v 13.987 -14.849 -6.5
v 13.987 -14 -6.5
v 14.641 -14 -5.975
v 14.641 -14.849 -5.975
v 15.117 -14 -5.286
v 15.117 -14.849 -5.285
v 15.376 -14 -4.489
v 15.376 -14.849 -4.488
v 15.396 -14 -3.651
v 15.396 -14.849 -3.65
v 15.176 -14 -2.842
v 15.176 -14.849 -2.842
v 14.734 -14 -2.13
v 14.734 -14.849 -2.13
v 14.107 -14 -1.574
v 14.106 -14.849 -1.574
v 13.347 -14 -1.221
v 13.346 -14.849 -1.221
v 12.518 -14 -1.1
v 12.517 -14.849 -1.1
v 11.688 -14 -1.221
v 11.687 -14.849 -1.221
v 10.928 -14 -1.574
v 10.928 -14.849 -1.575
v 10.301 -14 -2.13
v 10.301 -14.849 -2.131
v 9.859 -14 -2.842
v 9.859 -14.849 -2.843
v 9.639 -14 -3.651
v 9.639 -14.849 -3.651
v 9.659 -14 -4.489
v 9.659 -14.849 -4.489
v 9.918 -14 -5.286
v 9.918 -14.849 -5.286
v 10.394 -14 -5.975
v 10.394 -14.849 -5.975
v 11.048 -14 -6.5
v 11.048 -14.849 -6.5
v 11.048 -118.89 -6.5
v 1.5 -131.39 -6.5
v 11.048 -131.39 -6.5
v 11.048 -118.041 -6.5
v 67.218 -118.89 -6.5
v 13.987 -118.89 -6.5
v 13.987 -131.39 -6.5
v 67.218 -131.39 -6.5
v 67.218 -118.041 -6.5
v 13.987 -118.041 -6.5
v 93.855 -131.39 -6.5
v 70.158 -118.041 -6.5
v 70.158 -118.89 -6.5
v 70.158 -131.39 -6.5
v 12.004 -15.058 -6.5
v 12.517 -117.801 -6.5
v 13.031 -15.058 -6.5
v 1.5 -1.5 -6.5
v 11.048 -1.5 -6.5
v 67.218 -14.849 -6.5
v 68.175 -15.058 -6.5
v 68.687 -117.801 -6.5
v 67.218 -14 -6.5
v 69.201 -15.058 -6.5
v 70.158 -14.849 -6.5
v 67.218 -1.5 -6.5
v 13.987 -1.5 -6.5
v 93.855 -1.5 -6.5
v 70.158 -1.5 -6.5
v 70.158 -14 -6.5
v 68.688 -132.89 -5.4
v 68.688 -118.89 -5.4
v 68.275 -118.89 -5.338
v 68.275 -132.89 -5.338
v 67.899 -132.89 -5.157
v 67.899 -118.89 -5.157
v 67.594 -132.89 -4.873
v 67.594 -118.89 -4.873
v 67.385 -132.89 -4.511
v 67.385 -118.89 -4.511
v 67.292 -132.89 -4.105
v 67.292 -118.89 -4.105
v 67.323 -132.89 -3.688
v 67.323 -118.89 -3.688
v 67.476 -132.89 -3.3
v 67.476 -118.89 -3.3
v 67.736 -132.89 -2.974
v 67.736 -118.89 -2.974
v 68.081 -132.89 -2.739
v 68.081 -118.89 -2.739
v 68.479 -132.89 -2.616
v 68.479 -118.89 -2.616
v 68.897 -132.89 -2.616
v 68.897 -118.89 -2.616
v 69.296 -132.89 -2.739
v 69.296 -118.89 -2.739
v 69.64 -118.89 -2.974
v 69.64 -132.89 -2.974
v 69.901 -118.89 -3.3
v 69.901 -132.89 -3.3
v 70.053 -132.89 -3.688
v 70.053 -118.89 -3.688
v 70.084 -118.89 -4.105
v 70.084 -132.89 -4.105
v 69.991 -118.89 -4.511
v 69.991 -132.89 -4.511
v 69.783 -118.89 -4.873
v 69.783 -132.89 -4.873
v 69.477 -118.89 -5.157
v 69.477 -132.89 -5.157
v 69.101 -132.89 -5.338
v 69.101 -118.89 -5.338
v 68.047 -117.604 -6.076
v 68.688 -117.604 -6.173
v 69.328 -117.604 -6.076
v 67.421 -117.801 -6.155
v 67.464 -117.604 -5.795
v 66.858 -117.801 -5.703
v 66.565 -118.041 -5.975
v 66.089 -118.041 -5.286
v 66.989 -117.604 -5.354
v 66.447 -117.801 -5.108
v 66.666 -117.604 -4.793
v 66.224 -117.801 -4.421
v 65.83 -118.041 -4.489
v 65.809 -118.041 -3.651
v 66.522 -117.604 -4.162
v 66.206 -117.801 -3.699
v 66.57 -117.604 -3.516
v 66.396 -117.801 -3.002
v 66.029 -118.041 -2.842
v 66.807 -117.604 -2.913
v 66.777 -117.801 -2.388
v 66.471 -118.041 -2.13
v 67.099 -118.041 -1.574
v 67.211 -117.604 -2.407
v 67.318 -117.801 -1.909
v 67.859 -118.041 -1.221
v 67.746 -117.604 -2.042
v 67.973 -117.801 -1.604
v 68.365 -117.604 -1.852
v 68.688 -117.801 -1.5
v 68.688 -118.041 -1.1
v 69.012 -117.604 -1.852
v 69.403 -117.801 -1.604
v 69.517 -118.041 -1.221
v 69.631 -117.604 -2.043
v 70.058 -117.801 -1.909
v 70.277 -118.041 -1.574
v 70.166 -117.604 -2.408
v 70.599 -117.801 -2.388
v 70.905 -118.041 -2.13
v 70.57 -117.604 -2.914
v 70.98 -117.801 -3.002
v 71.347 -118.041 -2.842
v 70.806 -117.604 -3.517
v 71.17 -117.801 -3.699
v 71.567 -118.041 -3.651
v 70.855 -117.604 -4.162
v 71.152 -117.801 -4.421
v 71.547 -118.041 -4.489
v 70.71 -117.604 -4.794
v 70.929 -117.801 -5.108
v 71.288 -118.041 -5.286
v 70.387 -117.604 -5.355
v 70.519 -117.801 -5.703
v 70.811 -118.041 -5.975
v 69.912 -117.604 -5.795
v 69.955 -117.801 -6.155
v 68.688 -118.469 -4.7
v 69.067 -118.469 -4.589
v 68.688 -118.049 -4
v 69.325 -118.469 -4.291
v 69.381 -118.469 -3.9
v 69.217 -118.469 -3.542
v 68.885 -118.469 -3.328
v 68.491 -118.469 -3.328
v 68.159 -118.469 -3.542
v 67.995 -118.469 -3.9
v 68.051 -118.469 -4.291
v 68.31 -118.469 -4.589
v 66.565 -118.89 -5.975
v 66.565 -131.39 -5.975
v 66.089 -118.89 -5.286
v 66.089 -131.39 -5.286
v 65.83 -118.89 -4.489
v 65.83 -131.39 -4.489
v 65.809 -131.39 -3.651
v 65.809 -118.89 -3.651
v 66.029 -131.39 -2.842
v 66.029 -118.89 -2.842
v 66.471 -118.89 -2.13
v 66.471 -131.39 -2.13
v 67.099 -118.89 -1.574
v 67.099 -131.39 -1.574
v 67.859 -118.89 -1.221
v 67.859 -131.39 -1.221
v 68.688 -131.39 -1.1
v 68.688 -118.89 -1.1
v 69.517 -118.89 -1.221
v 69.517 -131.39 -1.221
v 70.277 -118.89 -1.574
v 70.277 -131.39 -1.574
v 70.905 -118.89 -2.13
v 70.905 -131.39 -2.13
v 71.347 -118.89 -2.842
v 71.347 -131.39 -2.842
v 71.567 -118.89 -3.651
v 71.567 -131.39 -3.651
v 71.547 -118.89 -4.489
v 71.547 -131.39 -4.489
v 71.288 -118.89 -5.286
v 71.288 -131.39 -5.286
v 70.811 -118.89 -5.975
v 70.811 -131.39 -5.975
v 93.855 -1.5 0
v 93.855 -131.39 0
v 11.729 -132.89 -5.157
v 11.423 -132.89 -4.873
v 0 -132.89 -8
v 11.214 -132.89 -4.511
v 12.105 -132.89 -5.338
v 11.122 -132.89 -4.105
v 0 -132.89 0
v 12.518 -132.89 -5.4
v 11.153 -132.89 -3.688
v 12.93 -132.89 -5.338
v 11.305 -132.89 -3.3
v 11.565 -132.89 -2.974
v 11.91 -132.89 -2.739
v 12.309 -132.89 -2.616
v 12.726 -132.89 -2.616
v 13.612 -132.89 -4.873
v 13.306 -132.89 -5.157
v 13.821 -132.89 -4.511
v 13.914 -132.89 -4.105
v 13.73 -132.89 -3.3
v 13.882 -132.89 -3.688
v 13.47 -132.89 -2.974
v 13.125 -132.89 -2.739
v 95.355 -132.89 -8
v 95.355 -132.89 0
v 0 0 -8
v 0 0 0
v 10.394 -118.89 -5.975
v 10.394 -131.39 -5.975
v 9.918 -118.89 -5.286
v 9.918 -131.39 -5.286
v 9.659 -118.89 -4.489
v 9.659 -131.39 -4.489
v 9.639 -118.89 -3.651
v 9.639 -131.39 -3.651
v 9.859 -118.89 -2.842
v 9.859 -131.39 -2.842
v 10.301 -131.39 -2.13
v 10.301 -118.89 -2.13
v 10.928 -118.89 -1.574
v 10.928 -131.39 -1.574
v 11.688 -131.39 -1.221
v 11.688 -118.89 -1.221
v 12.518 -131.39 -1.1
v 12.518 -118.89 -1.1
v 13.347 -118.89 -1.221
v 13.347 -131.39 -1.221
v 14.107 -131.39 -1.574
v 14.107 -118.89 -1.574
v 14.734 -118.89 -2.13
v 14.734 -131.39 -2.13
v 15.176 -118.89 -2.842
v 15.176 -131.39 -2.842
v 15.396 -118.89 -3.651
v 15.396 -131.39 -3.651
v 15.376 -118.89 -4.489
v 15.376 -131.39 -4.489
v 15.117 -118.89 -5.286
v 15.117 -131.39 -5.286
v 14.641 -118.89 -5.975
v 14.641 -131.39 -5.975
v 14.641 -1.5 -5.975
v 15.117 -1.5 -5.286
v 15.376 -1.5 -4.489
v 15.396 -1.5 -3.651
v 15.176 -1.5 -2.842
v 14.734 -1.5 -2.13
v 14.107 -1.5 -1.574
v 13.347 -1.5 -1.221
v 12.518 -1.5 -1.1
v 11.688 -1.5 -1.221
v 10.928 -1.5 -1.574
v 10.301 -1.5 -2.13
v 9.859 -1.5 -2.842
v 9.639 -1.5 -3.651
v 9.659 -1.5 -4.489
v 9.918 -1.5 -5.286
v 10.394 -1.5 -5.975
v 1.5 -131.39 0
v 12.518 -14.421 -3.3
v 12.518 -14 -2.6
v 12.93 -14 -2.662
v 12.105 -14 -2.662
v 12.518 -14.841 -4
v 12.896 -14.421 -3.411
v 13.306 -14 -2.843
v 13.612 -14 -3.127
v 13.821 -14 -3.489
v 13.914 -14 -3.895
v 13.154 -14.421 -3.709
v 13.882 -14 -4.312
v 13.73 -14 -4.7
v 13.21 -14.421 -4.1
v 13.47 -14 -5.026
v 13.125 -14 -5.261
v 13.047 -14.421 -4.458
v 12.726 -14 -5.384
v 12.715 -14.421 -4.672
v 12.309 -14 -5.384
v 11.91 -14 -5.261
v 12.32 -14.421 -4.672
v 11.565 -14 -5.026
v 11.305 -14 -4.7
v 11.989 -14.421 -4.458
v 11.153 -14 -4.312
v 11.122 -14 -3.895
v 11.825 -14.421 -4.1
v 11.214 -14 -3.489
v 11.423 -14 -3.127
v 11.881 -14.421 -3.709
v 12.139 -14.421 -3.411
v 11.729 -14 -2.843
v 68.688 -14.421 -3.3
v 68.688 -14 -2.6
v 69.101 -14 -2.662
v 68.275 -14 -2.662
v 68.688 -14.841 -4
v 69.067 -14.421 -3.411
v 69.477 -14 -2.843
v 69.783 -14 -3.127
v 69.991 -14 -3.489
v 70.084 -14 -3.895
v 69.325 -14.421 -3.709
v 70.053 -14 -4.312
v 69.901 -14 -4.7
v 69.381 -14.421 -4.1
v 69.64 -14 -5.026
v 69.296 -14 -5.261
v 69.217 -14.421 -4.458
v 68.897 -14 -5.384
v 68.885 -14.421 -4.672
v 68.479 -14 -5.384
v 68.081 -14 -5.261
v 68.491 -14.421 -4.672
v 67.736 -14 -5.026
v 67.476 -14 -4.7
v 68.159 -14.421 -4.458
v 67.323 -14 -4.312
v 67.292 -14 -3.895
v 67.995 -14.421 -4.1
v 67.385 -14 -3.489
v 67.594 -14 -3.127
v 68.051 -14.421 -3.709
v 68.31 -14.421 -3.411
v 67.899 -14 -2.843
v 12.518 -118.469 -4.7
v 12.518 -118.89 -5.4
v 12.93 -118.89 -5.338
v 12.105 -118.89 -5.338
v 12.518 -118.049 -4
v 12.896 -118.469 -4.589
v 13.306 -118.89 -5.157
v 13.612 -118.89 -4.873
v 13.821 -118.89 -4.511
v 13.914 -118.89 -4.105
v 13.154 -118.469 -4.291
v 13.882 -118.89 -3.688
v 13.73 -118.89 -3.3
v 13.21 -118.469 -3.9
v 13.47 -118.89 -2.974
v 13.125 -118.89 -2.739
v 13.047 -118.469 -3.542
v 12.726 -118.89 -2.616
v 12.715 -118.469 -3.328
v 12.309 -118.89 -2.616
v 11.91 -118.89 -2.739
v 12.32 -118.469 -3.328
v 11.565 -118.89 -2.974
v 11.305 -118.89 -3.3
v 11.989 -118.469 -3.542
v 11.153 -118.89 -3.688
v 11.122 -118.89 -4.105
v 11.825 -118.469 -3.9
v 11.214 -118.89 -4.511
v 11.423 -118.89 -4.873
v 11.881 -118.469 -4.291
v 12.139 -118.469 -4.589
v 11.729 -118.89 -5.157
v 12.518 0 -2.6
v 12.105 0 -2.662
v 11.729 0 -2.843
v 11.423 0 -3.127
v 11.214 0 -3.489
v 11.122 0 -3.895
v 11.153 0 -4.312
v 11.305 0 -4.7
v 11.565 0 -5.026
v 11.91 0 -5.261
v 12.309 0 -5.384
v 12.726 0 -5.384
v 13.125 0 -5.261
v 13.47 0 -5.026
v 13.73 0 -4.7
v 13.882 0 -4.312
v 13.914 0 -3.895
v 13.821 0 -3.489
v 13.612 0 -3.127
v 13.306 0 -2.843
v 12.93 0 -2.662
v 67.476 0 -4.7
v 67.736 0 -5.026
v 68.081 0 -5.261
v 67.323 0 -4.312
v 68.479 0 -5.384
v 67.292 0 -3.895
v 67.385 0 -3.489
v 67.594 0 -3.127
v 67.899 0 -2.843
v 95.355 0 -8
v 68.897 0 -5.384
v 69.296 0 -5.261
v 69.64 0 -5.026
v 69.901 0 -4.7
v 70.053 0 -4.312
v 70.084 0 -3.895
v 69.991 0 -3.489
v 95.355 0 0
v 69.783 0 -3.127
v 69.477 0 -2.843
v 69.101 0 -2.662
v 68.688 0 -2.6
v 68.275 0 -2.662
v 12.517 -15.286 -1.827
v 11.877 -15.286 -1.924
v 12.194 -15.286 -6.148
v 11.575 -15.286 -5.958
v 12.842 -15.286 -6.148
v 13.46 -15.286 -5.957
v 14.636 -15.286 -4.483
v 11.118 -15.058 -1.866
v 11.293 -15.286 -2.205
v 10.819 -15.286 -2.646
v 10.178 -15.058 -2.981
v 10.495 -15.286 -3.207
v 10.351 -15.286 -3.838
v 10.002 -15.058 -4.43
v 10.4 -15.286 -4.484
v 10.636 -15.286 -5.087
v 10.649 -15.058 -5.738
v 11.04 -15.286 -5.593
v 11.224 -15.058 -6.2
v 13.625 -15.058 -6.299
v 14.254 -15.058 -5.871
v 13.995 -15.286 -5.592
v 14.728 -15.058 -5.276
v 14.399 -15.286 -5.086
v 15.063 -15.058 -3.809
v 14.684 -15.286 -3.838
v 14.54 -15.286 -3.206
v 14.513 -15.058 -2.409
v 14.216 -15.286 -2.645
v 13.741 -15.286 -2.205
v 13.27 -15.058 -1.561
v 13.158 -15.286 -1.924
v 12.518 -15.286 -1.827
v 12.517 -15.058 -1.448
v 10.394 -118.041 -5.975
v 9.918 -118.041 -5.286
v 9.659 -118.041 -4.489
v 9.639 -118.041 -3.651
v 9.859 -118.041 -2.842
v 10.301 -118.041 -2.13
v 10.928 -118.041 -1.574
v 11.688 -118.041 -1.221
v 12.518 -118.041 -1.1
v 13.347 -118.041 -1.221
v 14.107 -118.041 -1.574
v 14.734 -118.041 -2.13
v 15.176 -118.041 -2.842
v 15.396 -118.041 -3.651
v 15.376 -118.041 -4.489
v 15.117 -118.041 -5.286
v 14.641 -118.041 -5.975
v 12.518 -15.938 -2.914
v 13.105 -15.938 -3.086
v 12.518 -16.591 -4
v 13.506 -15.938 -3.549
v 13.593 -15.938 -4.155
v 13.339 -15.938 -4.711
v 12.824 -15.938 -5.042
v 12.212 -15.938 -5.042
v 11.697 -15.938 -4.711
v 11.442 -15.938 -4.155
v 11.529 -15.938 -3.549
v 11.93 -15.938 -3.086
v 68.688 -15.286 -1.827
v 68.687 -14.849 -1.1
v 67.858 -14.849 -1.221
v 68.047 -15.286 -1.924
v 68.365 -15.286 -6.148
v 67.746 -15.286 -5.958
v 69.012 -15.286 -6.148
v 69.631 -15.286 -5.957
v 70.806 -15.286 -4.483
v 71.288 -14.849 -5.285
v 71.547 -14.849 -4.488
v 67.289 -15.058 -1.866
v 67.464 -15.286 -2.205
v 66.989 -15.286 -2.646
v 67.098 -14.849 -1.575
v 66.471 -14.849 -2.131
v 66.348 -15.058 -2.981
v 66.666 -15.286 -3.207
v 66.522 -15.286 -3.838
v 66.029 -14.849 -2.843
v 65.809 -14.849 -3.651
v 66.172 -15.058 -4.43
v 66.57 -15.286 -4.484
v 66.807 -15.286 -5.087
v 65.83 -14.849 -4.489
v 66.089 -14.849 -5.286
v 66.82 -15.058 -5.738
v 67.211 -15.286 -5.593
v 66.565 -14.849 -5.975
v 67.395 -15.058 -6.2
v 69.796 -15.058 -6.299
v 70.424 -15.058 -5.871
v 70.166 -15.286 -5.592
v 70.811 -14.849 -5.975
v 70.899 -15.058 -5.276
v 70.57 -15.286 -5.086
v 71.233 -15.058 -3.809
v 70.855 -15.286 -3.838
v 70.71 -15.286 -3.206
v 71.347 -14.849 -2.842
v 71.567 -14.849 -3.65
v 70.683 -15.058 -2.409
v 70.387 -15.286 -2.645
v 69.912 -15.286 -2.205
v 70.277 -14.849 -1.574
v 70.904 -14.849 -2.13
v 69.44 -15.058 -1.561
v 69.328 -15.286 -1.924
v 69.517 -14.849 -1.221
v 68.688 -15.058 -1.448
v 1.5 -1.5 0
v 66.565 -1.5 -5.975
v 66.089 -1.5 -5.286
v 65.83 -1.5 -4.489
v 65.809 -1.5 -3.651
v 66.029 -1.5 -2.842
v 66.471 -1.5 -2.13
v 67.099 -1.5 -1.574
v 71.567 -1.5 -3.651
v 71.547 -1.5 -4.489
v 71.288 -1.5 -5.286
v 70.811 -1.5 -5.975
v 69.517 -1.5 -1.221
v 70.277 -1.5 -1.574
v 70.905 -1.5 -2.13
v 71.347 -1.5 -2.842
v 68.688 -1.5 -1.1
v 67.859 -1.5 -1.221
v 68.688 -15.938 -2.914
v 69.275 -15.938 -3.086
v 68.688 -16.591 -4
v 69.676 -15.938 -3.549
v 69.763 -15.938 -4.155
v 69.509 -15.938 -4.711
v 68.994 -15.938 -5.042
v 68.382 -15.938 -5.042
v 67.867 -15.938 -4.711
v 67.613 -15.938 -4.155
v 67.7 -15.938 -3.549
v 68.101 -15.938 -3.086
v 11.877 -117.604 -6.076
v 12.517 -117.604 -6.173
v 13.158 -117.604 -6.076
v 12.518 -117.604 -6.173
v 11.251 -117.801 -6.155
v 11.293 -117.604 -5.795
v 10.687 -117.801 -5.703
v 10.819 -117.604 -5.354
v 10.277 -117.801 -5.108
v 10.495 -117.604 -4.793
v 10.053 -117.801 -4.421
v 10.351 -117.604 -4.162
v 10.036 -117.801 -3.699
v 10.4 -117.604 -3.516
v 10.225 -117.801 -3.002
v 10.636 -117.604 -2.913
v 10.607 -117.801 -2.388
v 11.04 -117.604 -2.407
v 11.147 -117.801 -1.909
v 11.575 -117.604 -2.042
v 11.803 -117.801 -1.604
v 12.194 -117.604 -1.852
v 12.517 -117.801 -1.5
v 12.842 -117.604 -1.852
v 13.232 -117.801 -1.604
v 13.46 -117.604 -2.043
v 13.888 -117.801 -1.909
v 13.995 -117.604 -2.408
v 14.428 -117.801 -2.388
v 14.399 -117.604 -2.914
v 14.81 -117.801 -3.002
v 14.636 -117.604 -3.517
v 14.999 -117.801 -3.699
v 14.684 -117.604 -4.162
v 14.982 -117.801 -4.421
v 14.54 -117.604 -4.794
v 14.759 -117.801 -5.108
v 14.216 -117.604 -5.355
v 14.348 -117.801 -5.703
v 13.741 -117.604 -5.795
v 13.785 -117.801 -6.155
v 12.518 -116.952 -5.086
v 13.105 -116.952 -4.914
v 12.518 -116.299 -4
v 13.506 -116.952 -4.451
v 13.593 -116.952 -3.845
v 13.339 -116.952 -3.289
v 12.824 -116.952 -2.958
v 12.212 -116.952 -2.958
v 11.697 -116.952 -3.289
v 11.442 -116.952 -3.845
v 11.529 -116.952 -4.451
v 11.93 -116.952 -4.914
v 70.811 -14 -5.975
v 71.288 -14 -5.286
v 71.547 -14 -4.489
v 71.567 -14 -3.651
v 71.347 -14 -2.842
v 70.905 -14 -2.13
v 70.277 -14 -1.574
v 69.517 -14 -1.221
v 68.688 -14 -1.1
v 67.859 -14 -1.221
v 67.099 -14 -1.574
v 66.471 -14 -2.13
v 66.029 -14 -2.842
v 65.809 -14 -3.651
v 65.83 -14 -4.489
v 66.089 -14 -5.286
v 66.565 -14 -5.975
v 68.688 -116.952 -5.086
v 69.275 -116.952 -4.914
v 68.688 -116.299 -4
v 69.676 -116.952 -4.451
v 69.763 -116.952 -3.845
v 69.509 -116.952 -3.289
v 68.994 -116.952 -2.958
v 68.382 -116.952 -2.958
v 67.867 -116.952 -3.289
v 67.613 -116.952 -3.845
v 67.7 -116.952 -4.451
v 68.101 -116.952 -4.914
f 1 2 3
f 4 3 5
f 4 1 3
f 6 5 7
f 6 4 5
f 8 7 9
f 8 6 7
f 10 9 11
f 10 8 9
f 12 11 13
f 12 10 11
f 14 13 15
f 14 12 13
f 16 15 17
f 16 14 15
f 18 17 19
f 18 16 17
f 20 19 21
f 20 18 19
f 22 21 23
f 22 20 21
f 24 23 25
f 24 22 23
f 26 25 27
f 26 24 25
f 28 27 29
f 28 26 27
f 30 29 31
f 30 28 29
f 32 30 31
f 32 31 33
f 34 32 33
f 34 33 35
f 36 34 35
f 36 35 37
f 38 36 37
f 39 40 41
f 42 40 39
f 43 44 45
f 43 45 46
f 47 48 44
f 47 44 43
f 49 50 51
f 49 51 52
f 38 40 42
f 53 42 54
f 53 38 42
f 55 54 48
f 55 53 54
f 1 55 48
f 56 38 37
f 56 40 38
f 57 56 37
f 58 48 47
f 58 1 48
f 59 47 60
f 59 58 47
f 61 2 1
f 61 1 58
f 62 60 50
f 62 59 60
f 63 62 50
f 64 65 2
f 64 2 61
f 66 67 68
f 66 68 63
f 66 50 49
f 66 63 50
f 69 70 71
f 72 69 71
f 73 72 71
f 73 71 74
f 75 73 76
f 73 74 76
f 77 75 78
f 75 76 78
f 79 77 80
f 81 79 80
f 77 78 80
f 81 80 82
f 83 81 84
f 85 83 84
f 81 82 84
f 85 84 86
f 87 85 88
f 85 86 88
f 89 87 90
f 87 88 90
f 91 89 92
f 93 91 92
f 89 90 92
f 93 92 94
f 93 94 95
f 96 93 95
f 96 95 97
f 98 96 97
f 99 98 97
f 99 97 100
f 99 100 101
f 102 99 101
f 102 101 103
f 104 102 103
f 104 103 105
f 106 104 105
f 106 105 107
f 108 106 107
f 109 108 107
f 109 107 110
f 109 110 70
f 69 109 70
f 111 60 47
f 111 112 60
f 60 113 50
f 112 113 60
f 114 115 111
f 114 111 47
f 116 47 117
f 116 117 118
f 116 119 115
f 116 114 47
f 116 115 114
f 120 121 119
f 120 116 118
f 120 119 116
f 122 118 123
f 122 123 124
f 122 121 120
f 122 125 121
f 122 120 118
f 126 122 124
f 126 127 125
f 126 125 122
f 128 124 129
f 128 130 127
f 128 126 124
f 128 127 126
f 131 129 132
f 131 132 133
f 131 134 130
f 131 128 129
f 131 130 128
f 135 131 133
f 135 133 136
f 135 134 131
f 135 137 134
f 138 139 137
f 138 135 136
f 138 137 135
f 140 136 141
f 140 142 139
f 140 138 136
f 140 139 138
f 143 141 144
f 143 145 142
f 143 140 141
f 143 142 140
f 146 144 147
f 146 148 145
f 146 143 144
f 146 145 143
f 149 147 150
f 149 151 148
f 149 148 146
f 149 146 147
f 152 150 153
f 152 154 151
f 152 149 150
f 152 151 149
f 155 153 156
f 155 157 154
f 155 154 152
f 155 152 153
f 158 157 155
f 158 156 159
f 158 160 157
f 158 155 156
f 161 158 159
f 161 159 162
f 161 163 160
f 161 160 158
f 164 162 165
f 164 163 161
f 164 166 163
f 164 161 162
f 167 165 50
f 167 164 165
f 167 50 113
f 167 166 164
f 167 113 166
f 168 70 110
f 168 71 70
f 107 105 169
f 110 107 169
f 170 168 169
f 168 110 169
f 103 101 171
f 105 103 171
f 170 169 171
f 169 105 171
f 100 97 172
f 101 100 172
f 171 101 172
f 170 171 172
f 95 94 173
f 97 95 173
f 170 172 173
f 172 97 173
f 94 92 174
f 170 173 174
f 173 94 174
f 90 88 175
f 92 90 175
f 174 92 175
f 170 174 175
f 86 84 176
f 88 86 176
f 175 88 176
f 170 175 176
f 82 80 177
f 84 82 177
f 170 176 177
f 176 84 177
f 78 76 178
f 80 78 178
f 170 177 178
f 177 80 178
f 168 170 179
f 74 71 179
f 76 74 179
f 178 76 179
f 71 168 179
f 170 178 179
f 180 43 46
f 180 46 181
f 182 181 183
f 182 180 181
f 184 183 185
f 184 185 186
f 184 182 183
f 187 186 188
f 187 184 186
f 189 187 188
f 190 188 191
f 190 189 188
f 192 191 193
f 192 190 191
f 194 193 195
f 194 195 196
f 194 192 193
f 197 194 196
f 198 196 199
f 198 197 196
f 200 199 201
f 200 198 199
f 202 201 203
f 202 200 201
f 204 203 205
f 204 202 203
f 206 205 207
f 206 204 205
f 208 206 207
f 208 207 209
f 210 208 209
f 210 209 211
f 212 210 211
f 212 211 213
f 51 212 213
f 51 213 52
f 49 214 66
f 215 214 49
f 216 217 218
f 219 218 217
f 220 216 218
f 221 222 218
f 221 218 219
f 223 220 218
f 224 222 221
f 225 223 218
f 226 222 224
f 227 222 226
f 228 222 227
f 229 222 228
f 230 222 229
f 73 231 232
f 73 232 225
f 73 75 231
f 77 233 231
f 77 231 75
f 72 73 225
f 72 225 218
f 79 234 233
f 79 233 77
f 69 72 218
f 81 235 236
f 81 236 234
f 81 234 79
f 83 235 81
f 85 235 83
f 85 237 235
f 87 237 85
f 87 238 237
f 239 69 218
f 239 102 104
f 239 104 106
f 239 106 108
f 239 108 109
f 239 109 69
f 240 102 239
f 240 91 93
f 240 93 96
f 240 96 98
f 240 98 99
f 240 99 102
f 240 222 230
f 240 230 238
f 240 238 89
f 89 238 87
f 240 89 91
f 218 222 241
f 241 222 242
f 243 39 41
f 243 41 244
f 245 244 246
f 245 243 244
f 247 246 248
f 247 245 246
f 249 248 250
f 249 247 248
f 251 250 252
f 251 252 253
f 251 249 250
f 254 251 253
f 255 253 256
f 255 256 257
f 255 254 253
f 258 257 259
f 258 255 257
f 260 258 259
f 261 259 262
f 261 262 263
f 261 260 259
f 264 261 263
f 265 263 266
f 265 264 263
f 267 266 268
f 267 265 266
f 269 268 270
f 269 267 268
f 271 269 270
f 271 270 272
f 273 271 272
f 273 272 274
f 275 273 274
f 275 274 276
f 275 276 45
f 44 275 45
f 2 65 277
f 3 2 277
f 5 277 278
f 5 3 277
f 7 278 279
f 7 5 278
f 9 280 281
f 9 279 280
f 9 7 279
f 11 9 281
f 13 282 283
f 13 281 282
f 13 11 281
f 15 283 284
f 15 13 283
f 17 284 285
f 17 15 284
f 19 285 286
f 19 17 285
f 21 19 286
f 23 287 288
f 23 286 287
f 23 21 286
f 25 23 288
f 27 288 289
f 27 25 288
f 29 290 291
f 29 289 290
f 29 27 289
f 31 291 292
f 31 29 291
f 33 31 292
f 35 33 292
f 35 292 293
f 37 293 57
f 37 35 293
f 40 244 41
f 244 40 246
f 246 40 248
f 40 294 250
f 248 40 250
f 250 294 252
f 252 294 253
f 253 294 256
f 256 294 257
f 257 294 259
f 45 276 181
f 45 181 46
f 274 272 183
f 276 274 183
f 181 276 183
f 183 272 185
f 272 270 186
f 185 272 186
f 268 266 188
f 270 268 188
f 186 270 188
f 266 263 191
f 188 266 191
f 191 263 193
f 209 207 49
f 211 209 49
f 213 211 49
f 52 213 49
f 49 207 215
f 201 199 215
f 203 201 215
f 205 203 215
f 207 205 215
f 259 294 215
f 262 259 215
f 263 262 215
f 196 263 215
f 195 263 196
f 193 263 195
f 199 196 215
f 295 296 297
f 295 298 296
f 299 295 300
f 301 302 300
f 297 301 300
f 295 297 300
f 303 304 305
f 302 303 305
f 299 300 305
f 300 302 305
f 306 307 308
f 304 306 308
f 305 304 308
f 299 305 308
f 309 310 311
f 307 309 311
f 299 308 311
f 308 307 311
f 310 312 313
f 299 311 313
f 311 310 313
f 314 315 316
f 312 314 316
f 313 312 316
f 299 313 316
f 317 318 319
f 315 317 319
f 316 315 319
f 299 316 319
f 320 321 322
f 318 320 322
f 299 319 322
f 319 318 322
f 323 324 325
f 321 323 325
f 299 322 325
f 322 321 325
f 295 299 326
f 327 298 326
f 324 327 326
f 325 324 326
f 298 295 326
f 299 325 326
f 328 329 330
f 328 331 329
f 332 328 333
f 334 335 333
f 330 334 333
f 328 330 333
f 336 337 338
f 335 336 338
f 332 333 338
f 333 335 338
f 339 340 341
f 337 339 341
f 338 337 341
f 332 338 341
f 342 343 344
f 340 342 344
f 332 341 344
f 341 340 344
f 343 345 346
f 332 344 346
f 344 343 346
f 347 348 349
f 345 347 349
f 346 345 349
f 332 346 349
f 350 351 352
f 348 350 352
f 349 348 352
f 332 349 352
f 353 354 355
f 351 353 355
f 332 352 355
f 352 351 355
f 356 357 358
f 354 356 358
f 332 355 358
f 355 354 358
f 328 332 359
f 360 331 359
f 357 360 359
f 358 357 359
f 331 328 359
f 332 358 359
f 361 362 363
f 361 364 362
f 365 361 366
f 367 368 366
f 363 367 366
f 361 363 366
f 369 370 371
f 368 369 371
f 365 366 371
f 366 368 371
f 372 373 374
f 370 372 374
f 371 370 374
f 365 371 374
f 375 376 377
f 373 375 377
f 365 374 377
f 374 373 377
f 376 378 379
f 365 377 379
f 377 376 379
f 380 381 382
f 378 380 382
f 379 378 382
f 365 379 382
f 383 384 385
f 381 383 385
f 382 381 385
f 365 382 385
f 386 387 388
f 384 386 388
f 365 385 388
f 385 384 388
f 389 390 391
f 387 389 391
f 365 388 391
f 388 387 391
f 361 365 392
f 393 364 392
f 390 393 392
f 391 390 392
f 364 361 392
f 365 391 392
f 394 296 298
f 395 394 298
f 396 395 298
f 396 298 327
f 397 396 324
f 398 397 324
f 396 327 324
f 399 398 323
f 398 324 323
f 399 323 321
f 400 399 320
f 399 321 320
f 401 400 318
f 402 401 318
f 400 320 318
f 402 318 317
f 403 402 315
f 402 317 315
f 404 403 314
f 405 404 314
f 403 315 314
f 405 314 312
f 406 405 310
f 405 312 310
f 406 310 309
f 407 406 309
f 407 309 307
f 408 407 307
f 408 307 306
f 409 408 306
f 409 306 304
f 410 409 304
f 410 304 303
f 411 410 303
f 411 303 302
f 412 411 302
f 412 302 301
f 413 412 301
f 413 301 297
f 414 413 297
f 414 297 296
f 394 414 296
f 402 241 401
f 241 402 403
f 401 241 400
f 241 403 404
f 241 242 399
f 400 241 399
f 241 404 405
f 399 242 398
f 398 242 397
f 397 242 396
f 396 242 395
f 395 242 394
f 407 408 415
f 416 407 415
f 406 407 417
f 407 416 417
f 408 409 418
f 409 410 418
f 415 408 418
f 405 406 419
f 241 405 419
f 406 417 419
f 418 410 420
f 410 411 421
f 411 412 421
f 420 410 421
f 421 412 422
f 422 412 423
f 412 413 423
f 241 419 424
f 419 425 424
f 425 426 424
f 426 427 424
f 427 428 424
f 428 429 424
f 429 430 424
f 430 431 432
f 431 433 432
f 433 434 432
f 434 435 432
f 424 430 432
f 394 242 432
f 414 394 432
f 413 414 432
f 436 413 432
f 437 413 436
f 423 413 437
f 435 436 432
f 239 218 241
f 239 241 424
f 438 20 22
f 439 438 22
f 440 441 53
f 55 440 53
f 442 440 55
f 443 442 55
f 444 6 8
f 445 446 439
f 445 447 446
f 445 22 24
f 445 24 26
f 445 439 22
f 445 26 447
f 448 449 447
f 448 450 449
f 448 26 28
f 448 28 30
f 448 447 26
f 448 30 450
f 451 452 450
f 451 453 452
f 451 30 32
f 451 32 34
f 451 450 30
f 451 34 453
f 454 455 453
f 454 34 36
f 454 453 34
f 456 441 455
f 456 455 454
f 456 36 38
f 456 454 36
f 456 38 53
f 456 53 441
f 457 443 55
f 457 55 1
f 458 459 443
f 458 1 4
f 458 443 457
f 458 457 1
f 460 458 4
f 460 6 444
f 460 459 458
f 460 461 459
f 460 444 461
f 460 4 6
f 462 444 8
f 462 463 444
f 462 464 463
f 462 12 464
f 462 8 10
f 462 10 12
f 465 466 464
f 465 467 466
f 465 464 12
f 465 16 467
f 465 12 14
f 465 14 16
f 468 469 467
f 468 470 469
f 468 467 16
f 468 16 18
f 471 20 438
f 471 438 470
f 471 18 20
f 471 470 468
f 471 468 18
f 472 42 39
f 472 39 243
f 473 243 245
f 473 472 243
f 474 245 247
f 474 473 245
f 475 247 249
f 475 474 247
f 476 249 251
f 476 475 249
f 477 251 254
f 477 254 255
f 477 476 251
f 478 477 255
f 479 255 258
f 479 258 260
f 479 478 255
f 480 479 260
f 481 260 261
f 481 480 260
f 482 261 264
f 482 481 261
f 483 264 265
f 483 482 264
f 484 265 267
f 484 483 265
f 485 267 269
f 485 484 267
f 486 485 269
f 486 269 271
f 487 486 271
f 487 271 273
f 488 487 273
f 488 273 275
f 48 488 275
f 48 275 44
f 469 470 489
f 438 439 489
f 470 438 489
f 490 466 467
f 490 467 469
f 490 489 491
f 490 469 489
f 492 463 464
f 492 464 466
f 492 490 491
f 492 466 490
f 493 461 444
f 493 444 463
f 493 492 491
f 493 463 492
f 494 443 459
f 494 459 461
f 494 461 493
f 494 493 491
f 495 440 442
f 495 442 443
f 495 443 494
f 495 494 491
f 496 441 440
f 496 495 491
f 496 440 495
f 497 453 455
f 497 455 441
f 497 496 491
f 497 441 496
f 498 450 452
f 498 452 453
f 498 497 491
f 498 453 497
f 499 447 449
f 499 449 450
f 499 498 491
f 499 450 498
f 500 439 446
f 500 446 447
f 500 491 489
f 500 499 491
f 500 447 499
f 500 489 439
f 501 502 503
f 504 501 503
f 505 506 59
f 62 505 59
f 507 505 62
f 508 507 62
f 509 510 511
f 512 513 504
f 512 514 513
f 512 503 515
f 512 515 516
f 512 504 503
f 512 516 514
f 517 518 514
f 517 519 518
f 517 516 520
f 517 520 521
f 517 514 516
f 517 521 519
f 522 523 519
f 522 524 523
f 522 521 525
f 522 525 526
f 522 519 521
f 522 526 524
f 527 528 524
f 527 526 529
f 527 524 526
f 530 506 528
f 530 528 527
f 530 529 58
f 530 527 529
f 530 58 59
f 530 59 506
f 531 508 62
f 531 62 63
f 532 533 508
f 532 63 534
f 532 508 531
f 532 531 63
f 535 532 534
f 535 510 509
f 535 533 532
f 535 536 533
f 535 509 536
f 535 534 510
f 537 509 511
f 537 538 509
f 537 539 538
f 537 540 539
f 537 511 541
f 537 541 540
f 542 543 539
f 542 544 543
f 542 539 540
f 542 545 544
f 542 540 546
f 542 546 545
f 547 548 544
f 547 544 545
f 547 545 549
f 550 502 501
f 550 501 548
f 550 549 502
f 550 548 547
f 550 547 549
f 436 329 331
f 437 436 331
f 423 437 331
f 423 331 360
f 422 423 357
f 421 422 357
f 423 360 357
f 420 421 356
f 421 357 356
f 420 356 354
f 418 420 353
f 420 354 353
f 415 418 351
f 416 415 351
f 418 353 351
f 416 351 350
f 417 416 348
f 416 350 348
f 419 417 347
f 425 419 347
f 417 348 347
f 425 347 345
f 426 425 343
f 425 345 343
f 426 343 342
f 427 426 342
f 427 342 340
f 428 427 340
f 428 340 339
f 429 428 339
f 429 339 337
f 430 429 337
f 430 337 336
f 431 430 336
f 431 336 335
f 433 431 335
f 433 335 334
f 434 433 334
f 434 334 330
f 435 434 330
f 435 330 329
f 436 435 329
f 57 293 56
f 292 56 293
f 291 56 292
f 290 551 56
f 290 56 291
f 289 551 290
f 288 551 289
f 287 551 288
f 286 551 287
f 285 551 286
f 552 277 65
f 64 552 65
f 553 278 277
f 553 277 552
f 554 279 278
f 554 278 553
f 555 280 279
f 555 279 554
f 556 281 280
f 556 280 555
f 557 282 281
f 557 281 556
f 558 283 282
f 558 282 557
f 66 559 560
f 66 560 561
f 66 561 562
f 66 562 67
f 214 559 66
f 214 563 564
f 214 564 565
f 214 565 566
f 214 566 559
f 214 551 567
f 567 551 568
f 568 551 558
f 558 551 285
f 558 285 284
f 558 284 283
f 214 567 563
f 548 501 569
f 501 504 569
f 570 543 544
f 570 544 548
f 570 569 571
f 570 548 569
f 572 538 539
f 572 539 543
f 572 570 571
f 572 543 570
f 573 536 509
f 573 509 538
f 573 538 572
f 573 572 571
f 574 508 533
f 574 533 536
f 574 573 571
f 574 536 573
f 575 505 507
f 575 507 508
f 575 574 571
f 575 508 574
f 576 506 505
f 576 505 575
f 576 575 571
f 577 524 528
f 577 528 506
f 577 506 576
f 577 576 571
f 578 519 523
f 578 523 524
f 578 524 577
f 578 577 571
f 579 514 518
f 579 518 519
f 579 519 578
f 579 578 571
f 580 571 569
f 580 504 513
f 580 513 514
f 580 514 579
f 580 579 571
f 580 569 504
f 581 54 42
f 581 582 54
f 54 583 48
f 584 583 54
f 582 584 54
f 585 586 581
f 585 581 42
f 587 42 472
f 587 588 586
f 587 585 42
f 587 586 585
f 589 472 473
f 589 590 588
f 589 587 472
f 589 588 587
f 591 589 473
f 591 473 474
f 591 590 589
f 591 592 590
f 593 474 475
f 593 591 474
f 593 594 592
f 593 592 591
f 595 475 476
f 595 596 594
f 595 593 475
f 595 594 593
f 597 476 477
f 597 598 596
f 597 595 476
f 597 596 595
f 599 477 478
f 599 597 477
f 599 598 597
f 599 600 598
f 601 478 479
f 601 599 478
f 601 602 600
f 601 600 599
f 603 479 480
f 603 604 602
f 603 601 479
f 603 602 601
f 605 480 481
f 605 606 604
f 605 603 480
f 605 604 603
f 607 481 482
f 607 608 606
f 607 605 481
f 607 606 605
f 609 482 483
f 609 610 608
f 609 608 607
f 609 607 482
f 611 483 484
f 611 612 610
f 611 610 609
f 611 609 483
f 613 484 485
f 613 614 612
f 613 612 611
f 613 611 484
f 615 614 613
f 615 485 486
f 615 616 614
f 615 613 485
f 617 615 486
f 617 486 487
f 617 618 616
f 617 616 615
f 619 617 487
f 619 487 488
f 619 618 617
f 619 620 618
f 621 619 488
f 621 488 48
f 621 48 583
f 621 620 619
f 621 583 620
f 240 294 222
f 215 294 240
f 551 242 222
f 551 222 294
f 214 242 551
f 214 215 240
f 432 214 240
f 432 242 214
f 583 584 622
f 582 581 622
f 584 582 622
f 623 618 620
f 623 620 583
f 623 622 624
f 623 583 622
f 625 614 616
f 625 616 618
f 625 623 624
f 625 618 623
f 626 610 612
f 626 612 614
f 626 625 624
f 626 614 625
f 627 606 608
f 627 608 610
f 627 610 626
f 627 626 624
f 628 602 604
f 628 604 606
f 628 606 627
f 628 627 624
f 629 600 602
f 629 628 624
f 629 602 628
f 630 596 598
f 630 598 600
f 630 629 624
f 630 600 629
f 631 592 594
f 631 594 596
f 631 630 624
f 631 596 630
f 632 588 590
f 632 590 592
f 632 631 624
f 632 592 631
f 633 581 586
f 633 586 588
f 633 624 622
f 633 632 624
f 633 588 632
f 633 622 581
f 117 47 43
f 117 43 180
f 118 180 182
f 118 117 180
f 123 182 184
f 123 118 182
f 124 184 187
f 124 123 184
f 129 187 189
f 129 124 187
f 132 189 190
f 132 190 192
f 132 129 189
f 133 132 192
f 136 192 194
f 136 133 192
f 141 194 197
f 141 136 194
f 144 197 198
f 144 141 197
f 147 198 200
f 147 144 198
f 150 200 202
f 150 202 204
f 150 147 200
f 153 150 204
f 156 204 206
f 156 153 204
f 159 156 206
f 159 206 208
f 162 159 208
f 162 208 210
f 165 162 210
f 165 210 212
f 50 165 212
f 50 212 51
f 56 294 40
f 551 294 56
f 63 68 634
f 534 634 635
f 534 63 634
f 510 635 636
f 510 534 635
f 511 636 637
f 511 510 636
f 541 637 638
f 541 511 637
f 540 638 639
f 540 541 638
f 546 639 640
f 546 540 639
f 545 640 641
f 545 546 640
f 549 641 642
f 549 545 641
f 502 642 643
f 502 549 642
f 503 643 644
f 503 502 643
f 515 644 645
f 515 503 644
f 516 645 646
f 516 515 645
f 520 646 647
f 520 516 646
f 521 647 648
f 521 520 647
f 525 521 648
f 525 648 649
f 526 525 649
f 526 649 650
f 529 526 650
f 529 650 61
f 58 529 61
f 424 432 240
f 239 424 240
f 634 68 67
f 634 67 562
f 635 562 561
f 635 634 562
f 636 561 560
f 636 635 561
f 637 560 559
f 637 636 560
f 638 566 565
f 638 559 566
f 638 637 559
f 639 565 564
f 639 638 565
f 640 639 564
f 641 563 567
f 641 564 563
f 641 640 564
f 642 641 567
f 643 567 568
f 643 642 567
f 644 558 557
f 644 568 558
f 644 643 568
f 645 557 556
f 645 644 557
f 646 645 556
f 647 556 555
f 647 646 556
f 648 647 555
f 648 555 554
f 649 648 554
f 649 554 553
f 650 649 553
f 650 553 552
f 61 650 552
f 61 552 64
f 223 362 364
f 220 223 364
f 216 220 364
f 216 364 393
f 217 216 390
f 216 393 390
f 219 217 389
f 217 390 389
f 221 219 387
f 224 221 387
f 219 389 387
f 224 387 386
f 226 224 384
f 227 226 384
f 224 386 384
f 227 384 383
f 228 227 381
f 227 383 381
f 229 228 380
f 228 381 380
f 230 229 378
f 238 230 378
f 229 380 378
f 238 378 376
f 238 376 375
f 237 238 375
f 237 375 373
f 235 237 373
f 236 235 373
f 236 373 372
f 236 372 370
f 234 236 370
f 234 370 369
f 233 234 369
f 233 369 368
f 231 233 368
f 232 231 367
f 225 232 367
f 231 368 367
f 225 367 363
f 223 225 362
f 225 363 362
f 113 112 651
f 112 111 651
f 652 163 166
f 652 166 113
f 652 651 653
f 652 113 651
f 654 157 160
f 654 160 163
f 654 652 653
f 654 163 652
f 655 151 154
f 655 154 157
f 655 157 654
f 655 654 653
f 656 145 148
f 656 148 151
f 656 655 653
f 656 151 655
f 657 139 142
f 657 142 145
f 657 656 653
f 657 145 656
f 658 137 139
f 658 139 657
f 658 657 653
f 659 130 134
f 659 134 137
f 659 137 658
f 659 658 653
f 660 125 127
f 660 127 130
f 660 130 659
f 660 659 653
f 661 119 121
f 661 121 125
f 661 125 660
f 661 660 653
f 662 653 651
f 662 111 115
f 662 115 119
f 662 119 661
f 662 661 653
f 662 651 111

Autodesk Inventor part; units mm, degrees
ref_plane "YZ Plane" through (0, 0, 0) normal (1, 0, 0) x (0, 1, 0)
ref_plane "XZ Plane" through (0, 0, 0) normal (0, 1, 0) x (-1, 0, 0)
ref_plane "Arbeitsebene1" through (0, -137.89, 0) normal (0, 0, 1) x (1, 0, 0)
sketch "Skizze1" plane through (0, -137.89, 0) normal (0, 0, 1) x (1, 0, 0)
  line L0 (0, 0) -> (95.3553, 0) projected
  line L1 (95.3553, 0) -> (95.3553, 5) projected
  line L2 (0, 5) -> (95.3553, 5) projected
  line L3 (0, 0) -> (0, 5) projected
  line L4 (0, 137.89) -> (95.3553, 137.89) projected
  line L5 (95.3553, 137.89) -> (95.3553, 142.89) projected
  line L6 (0, 142.89) -> (95.3553, 142.89) projected
  line L7 (0, 137.89) -> (0, 142.89) projected
  line L8 (95.3553, 5) -> (0, 5)
  line L9 (0, 5) -> (0, 137.89)
  line L10 (0, 137.89) -> (95.3553, 137.89)
  line L11 (95.3553, 137.89) -> (95.3553, 5)
ref_plane "Arbeitsebene2" through (0, 0, -8) normal (0, 0, -1) x (0, 1, 0)
extrude "Extrusion1" add sketch "Skizze1" against normal up to surface (8 mm away) contours L9 L4 L11 L2
sketch "Skizze2" plane through (0, 0, 0) normal (0, 1, 0) x (1, 0, 0)
  circle A0 centre (68.6881, 4) radius 1.4 projected
  circle A1 centre (12.5176, 4) radius 1.4 projected
  line L0 (0, 0) -> (95.3553, 0) projected
  line L1 (95.3553, 0) -> (95.3553, 68) projected
  line L2 (95.3553, 68) -> (42.0208, 121.3345) projected
  line L3 (42.0208, 121.3345) -> (36.364, 115.6777) projected
  line L4 (36.364, 115.6777) -> (87.3553, 64.6863) projected
  line L5 (87.3553, 64.6863) -> (87.3553, 8) projected
  line L6 (87.3553, 8) -> (0, 8) projected
  line L7 (0, 8) -> (0, 0) projected
  circle A2 centre (42.0208, 115.6777) radius 1.49 projected
  circle A3 centre (72.0208, 85.6777) radius 1.4 projected
  circle A4 centre (57.0208, 100.6777) radius 1.4 projected
hole "Bohrung1" at (68.6881, 0, -4) at (12.5176, 0, -4) direction (0, -1, 0) diameter 2.8 depth 14 tip angle 118
sketch "Skizze3" plane through (0, -132.89, 0) normal (0, -1, 0) x (1, 0, 0)
  circle A0 centre (68.6881, -4) radius 1.4 projected
  circle A1 centre (12.5176, -4) radius 1.4 projected
  line L0 (0, 0) -> (95.3553, 0) projected
  line L1 (0, -8) -> (0, 0) projected
  line L2 (87.3553, -8) -> (0, -8) projected
  line L3 (87.3553, -64.6863) -> (87.3553, -8) projected
  line L4 (36.364, -115.6777) -> (87.3553, -64.6863) projected
  line L5 (42.0208, -121.3345) -> (36.364, -115.6777) projected
  line L6 (95.3553, -68) -> (42.0208, -121.3345) projected
  line L7 (95.3553, 0) -> (95.3553, -68) projected
  circle A2 centre (42.0208, -115.6777) radius 1.49 projected
  circle A3 centre (72.0208, -85.6777) radius 1.4 projected
  circle A4 centre (57.0208, -100.6777) radius 1.4 projected
hole "Bohrung2" at (68.6881, -132.89, -4) at (12.5176, -132.89, -4) direction (0, 1, 0) diameter 2.8 depth 14 tip angle 118
shell "Wandung1" thickness 1.5 removed faces 1 at (63.5702, -44.2967, 0)
properties part number "NematostellaImager_illuminationplate"
